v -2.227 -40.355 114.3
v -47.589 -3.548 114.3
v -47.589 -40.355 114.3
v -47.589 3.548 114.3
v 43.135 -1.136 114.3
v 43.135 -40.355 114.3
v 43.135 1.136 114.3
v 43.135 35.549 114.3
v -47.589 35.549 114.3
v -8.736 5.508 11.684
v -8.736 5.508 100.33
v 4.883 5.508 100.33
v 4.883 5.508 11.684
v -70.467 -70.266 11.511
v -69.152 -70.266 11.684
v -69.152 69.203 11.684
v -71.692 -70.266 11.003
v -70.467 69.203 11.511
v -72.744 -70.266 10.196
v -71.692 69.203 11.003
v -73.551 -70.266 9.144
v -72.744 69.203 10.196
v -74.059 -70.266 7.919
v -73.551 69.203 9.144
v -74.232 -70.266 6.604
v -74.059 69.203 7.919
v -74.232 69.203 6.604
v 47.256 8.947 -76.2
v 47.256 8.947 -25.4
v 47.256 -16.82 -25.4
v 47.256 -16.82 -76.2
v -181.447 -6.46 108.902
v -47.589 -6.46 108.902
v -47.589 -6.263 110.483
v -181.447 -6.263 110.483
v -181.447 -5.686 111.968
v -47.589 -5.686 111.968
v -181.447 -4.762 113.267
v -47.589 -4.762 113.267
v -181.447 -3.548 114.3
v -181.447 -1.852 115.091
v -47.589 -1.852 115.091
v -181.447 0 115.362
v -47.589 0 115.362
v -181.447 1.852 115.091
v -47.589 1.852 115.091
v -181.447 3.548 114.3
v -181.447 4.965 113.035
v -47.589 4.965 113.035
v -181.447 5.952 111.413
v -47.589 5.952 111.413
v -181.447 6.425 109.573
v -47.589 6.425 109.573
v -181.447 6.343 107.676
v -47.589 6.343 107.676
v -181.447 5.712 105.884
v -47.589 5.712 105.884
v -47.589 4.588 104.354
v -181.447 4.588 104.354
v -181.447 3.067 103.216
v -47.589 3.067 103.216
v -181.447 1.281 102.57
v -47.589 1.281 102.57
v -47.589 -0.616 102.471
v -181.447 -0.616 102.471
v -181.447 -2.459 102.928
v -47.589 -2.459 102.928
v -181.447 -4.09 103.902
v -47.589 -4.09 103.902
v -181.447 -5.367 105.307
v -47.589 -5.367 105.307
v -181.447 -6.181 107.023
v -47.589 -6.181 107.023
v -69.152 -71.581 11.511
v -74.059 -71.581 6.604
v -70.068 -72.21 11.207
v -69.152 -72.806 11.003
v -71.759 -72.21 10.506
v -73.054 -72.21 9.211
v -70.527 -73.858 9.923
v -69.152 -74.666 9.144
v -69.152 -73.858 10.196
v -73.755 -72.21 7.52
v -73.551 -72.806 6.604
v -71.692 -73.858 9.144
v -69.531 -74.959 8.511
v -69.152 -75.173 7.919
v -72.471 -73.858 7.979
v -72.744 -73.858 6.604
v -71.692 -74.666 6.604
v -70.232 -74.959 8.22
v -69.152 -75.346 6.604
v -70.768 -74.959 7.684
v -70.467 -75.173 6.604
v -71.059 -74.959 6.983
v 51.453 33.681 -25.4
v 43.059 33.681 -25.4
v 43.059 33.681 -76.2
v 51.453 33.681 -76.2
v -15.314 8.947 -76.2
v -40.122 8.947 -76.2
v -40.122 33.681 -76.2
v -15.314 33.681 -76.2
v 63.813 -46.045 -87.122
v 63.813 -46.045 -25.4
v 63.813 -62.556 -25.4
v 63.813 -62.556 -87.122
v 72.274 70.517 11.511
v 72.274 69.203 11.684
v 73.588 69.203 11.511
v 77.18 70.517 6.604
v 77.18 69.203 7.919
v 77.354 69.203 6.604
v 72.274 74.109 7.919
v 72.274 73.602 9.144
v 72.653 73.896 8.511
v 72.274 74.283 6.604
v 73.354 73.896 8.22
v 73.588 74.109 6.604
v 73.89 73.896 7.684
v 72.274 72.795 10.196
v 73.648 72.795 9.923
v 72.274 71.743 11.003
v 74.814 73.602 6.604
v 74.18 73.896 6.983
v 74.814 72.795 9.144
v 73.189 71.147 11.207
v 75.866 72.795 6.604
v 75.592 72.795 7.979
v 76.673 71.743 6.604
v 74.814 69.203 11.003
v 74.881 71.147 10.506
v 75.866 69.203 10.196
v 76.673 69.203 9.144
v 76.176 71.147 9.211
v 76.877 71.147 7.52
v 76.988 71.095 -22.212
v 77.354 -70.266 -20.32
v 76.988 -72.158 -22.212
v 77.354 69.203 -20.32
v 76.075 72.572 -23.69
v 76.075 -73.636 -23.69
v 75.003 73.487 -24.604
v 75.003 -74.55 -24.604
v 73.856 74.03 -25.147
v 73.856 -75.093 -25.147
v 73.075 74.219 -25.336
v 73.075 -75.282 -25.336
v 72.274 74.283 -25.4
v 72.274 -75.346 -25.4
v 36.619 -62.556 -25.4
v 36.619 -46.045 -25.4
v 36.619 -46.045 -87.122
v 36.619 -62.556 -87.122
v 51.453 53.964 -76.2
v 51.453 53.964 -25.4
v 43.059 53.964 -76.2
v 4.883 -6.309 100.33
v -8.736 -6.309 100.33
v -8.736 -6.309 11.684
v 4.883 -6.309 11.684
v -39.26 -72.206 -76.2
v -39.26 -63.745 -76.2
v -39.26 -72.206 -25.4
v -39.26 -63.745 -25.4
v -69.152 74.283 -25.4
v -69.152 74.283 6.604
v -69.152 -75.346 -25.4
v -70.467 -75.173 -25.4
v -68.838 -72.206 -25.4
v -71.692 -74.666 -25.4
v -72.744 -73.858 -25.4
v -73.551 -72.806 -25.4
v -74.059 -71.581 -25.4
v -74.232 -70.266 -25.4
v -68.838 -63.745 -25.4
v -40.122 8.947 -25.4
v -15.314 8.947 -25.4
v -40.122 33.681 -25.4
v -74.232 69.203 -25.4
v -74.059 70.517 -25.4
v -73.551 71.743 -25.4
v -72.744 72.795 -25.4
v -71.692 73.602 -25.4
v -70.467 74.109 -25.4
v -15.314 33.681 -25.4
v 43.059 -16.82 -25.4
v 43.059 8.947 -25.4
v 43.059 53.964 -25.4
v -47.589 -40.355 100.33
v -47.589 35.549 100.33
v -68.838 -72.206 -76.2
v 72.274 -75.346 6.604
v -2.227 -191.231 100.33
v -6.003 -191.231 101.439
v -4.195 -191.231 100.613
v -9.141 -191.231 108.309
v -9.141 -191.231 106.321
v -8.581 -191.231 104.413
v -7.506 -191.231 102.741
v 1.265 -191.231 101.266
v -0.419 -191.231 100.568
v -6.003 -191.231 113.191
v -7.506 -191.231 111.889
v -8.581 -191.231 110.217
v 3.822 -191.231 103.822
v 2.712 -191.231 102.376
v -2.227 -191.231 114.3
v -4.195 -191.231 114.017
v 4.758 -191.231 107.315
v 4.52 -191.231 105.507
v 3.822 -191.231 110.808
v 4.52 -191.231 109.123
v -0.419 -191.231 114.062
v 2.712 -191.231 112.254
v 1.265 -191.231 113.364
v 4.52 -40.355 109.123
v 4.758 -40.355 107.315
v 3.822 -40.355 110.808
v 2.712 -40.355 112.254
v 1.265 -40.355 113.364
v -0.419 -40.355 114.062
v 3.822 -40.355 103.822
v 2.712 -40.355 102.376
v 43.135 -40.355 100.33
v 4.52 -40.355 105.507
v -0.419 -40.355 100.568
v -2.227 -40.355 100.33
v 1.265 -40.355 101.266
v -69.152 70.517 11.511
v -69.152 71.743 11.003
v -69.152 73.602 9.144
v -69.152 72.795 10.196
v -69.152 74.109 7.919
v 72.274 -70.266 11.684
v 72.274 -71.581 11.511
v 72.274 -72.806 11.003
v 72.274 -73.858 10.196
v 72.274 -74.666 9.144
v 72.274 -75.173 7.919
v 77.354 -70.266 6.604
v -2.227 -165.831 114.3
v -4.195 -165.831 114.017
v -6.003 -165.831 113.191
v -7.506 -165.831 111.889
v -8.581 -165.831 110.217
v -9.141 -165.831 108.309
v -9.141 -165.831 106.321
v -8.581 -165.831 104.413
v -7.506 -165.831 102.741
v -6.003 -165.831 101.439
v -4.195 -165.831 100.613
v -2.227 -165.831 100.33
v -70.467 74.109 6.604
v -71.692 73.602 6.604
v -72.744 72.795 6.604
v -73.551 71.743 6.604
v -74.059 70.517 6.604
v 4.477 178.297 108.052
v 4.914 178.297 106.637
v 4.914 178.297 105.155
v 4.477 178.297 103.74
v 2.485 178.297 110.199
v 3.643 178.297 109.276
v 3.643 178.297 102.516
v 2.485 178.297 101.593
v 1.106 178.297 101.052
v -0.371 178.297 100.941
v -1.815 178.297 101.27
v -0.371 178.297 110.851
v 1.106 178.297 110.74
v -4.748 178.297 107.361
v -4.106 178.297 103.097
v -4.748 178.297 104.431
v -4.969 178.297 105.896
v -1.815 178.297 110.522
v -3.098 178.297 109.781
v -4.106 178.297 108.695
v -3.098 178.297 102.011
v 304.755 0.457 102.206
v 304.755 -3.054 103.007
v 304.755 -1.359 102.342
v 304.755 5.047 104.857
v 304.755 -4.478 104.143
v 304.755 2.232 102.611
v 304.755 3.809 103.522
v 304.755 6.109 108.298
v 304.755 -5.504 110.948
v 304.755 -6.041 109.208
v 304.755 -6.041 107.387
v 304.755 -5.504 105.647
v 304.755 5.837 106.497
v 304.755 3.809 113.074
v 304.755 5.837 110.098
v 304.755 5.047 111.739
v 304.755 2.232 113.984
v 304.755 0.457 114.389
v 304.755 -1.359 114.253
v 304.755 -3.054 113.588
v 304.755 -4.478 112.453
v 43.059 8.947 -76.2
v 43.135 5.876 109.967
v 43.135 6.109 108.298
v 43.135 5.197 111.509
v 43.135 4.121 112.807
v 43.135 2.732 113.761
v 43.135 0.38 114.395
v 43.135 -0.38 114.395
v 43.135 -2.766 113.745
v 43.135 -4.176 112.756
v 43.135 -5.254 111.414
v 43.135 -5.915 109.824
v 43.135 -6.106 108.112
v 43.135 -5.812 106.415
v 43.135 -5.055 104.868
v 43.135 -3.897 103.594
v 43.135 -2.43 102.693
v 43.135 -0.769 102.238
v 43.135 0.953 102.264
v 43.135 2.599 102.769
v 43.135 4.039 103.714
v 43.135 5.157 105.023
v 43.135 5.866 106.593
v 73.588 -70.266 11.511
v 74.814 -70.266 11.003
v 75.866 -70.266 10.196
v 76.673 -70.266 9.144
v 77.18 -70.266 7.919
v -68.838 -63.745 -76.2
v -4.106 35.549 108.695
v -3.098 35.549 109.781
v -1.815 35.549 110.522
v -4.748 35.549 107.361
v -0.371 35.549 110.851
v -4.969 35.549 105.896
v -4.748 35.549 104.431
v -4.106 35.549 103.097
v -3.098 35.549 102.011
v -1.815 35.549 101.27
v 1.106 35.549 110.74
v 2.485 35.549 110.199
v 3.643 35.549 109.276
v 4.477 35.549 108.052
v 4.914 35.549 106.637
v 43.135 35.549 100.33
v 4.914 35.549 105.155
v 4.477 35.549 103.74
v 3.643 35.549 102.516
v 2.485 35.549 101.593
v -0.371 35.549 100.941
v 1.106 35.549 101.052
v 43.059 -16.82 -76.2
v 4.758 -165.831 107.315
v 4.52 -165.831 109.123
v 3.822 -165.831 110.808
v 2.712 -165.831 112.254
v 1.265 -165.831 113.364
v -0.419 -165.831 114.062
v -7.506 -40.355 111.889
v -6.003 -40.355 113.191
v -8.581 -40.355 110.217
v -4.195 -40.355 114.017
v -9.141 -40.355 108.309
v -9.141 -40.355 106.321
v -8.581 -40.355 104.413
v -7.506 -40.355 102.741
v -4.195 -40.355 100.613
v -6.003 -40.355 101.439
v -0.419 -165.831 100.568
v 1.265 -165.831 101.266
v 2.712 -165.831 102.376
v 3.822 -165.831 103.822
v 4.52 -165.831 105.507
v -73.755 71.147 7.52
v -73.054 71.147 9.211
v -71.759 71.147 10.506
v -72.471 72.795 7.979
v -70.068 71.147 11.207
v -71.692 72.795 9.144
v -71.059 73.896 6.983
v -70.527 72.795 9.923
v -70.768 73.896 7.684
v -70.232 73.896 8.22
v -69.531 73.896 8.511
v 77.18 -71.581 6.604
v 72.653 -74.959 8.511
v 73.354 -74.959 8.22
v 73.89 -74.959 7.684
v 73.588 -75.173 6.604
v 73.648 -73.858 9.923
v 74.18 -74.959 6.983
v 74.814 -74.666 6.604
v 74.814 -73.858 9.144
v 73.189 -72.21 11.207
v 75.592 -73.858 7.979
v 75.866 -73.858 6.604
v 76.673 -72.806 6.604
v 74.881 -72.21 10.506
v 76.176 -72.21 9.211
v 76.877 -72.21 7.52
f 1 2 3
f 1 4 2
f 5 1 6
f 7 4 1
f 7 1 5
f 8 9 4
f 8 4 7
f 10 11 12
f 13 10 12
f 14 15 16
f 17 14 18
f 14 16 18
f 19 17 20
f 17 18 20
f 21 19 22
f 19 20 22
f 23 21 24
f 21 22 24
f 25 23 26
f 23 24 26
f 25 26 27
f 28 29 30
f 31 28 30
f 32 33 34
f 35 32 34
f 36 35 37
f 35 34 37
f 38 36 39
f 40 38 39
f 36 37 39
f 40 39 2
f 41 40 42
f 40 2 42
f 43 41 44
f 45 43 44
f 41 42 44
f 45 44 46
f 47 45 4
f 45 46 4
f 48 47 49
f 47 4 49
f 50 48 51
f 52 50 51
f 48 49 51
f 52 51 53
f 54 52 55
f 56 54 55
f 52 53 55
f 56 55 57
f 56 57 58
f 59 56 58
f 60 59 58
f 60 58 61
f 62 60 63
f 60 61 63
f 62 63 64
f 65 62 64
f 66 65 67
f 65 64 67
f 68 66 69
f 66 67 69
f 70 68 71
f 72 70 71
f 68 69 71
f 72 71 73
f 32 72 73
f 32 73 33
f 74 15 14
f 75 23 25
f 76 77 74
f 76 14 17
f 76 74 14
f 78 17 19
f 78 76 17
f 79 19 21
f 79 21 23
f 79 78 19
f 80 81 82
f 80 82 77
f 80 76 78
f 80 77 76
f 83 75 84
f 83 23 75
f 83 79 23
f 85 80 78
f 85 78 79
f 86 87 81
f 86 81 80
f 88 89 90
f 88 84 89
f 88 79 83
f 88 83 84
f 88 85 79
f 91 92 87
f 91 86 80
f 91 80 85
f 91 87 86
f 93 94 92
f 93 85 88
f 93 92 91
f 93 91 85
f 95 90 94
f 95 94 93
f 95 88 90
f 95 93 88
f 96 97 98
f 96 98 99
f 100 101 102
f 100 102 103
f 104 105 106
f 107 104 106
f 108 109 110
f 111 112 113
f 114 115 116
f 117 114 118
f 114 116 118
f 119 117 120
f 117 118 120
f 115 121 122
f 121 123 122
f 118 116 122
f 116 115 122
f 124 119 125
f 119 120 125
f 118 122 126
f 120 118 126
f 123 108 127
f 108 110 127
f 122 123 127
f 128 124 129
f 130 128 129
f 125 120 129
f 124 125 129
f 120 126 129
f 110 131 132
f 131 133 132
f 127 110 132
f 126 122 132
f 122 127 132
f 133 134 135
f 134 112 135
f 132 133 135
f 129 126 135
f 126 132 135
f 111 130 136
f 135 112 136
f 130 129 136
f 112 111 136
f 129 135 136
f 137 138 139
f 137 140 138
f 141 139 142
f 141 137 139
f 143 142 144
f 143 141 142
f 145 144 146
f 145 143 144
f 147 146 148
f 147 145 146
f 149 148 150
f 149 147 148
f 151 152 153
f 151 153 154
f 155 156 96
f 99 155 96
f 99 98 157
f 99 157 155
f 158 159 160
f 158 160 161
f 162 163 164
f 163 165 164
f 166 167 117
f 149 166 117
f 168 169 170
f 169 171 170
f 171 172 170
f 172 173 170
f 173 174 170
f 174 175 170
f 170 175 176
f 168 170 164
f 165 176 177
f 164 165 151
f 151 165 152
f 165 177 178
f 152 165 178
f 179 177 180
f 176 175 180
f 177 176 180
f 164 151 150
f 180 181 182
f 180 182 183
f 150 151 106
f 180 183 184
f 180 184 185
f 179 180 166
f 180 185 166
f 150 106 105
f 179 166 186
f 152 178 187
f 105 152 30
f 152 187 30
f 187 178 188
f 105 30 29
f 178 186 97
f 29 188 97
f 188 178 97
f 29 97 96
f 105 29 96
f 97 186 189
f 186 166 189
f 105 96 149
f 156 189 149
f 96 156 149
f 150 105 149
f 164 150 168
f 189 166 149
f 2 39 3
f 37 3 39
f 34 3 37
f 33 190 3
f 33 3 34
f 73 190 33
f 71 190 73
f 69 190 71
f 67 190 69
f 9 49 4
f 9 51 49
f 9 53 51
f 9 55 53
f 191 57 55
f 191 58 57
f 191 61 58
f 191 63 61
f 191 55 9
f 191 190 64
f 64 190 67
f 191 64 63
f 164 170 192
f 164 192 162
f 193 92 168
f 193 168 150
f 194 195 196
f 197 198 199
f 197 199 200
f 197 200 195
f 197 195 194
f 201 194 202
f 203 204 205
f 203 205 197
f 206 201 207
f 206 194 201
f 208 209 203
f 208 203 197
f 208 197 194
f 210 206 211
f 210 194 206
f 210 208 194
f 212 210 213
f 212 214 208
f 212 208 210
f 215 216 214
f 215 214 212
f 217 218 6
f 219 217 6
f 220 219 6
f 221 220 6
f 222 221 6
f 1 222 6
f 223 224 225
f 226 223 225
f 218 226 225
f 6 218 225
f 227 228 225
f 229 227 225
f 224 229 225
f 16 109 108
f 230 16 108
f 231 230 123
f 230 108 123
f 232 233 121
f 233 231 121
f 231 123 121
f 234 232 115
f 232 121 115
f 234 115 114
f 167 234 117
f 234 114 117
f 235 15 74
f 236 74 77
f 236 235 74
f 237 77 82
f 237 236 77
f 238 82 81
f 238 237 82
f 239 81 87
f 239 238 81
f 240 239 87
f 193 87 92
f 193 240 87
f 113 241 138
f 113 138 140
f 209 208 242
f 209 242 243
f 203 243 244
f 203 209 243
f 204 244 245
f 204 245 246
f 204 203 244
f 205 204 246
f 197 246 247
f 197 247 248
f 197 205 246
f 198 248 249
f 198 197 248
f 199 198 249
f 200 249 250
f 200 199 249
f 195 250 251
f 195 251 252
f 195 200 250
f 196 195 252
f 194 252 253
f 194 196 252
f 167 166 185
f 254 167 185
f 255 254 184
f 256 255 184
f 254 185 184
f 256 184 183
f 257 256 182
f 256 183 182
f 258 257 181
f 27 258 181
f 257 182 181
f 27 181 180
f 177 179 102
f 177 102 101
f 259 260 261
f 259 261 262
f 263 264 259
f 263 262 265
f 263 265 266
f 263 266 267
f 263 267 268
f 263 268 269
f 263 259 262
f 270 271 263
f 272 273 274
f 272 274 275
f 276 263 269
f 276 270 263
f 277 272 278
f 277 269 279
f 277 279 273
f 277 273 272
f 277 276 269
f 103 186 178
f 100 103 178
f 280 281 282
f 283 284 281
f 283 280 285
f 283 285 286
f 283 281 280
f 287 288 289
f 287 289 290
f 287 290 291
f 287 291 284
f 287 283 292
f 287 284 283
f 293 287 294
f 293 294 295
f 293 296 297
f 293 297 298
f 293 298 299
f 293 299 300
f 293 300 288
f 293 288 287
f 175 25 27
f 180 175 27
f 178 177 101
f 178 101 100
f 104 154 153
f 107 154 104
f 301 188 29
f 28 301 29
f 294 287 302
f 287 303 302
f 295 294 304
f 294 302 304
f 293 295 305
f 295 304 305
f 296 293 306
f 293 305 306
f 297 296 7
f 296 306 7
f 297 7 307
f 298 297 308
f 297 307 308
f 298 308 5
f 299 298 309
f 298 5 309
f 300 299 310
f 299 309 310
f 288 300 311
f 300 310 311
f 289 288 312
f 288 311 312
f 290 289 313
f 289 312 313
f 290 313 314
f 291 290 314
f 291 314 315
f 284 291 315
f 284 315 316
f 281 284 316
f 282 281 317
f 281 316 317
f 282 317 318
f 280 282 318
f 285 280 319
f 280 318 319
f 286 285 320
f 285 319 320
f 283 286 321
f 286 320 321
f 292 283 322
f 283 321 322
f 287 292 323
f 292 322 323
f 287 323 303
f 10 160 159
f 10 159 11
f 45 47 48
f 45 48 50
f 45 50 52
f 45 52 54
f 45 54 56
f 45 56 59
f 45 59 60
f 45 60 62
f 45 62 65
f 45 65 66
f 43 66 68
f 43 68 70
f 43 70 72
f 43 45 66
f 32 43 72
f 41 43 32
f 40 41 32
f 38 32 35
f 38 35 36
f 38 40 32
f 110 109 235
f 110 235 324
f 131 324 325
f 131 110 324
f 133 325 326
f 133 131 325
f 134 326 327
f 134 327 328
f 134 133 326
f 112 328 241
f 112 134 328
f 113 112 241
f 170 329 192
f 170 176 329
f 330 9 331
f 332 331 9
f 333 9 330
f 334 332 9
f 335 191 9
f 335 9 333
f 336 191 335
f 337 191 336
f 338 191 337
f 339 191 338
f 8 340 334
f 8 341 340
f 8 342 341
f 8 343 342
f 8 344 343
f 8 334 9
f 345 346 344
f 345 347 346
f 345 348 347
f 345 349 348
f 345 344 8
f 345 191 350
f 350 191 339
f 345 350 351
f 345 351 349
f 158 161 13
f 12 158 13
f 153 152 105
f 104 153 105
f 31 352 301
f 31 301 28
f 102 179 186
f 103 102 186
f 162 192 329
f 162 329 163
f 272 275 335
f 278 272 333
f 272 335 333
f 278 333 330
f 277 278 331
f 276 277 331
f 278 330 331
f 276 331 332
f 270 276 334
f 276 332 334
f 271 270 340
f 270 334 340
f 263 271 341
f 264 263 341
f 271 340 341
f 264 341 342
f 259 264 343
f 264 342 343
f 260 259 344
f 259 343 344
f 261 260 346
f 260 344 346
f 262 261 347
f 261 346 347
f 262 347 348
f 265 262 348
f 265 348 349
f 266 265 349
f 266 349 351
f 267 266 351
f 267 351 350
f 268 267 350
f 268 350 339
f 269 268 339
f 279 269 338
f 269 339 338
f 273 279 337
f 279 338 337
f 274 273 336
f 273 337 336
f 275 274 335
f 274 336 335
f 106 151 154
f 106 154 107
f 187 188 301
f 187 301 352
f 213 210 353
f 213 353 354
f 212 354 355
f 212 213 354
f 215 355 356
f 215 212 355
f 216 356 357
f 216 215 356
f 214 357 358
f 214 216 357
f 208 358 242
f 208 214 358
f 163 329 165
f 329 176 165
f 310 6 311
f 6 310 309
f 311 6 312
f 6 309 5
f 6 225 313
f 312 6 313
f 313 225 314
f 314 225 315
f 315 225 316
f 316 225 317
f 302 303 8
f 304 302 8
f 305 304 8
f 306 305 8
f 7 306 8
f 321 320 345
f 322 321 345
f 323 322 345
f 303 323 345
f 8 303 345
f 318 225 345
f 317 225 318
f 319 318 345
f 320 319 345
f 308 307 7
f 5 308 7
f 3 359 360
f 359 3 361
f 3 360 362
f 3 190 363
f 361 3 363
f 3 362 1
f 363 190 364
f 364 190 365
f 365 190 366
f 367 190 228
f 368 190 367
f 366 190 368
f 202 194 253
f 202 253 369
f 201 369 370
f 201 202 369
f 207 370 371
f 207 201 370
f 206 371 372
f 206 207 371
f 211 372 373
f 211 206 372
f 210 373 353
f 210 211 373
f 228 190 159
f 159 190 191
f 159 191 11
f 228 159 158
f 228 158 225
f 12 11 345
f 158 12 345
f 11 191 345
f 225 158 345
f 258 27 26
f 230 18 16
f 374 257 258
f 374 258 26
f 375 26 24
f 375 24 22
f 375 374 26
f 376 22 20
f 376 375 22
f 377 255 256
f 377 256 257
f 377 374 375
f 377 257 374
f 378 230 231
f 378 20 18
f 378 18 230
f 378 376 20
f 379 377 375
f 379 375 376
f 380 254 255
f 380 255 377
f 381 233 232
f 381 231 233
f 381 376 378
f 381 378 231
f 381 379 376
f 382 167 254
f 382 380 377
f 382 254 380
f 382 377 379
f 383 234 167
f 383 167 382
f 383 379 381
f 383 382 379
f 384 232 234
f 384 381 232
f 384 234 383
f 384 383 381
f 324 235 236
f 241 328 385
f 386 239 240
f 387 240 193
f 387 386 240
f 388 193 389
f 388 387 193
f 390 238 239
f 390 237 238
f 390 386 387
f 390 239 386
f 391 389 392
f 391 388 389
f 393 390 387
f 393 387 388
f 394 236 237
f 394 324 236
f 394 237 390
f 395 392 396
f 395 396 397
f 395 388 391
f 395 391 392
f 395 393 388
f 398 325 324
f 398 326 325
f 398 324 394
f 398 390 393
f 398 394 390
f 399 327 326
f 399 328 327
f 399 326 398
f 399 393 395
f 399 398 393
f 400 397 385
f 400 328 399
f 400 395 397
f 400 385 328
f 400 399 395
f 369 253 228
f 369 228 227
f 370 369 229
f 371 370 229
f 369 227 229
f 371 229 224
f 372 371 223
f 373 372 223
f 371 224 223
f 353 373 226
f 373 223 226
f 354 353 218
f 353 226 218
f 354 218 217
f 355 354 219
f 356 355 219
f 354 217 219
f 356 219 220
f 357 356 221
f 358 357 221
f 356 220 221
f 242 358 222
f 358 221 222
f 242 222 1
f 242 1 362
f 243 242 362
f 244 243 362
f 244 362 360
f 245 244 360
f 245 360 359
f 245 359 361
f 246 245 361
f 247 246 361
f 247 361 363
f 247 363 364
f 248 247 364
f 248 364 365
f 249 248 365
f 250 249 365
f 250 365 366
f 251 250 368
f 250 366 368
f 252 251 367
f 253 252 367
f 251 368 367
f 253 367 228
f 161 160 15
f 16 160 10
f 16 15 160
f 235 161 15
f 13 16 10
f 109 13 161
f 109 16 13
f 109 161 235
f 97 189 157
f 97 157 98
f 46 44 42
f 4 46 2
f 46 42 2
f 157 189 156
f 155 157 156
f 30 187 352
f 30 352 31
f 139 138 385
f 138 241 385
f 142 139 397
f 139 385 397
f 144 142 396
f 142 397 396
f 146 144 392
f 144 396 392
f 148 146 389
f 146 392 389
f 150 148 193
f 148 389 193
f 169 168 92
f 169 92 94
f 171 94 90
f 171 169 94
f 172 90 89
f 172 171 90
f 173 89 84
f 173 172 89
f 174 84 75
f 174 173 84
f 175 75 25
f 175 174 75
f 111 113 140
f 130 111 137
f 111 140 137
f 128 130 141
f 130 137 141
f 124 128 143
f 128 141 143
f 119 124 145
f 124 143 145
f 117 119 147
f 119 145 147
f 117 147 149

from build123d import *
from build123d import SkipClean  # not in build123d's __all__

# Parameters (mm, degrees)
F0_W          = 151.5855640173
F0_H          = 149.6286615729
F1_DEPTH      = 11.684
F2_DEPTH      = 25.4
F3_W          = 4.1966233402
F3_H          = 25.7666455582
F3_W_2        = 24.8086545616
F3_H_2        = 24.7343285009
F3_W_3        = 8.3932466805
F3_H_3        = 20.2822238207
F3_W_4        = 29.5776501298
F3_H_4        = 8.4610134363
F5_DEPTH      = 25.4
F6_DEPTH      = 25.4
F8_W          = 13.618723955
F8_H          = 11.8162455037
F9_DEPTH      = 88.646
F10_W         = 90.7247327268
F10_H         = 75.9043544531
F11_DEPTH     = 13.97
F13_DEPTH     = 25.4
F14_DEPTH     = 125.476
F16_DEPTH     = 25.4
F17_R         = 4.969033059
F18_DEPTH     = 117.348
F20_DEPTH     = 87.376
F21_R         = 6.1087740457
F22_DEPTH     = 25.4
F23_DEPTH     = 25.4
F24_DEPTH     = 25.4
F25_R         = 5.08
F26_T1_DEPTH  = 44.704
F26_S5_W      = 5.08
F26_S5_H      = 5.08
F26_T6_DEPTH  = 5.08
F26_S11_W     = 5.08
F26_S11_H     = 5.08
F26_T12_DEPTH = 5.08
F27_W         = 27.1943286061
F27_H         = 16.5108405054
F28_DEPTH     = 61.722
F29_DEPTH     = 25.4
F30_DEPTH     = 160.02
F31_DEPTH     = 46.482


# Not quite as in the source:
# - a fillet or chamfer that OpenCascade refuses, or shapes differently, is made with other operations: its cross-section is extruded or revolved along the edge and cut away or added
# - after a boolean that leaves OpenCascade's solid faulty, fix() repairs it
# - a feature names something its author has since deleted; it is built from what else it names


with BuildPart() as f1:
    # F0 (on Top) → F1 (new body)
    with BuildSketch(Plane.XY):
        with Locations((1.5608146787, -0.5317740142)):
            Rectangle(F0_W, F0_H)
    extrude(amount=F1_DEPTH)

    # F2 (add): a face of the model
    f2_faces = [f1.faces().sort_by_distance(p)[0] for p in [
        (1.5608146787, -0.5317740142, 0),
    ]]
    extrude(f2_faces, amount=F2_DEPTH)

    # F3 (on face) → F5 (join)
    with BuildSketch(Plane(origin=(0, 0, -25.4), x_dir=(1, 0, 0), z_dir=(0, 0, -1))):
        with Locations((45.1576719061, 3.9362064563)):
            Rectangle(F3_W, F3_H)
        with Locations((-27.7178613469, -21.3142805733)):
            Rectangle(F3_W_2, F3_H_2)
        with Locations((47.2559835762, -43.8225567341)):
            Rectangle(F3_W_3, F3_H_3)
        with Locations((-54.0488772094, 67.9751783609)):
            Rectangle(F3_W_4, F3_H_4)
    extrude(amount=F5_DEPTH)

    # F6 (add): faces of the model
    f6_faces = [f1.faces().sort_by_distance(p)[0] for p in [
        (-54.0488772094, -67.9751783609, -50.8),
        (-27.7178613469, 21.3142805733, -50.8),
        (45.1576719061, -3.9362064563, -50.8),
        (47.2559835762, 43.8225567341, -50.8),
    ]]
    extrude(f6_faces, amount=F6_DEPTH)

    # F8 (on face) → F9 (join)
    with BuildSketch(Plane.XY.offset(11.684)):
        with Locations((-1.9266440067, -0.4005506635)):
            Rectangle(F8_W, F8_H)
    extrude(amount=F9_DEPTH)

    # F10 (on face) → F11 (join)
    with BuildSketch(Plane.XY.offset(100.33)):
        with Locations((-2.2270549089, -2.4033039808)):
            Rectangle(F10_W, F10_H)
    extrude(amount=F11_DEPTH)

    # F12 (on face) → F13 (join)
    with BuildSketch(Plane.XZ.offset(40.3554812074)):
        with BuildLine():
            ThreePointArc((-2.2270549227, 100.33), (2.7120859528, 102.3758591285), (4.7579450911, 107.315))
            ThreePointArc((4.7579450911, 107.315), (2.712085945, 112.2541408793), (-2.227054945, 114.3))
            ThreePointArc((-2.227054945, 114.3), (-9.2120549089, 107.3149999888), (-2.2270549227, 100.33))
        make_face()
    extrude(amount=F13_DEPTH)

    # F14 (add): a face of the model
    f14_faces = [f1.faces().sort_by_distance(p)[0] for p in [
        (-2.2270549089, -65.7554812074, 107.315),
    ]]
    with SkipClean():  # cleaning this boolean's faces spoils the solid; the shape is the same uncleaned
        extrude(f14_faces, amount=F14_DEPTH)

    # F15 (on face) → F16 (join)
    with BuildSketch(Plane.YZ.offset(43.1353114545)):
        with BuildLine():
            Line((-1.1355586467, 114.3), (1.1355586467, 114.3))
            ThreePointArc((1.1355586467, 114.3), (0, 114.4064722454), (-1.1355586467, 114.3))
        make_face()
        with BuildLine():
            ThreePointArc((-1.1355586467, 114.3), (-3.8974510358, 103.5937641266), (6.1087740457, 108.2976981997))
            ThreePointArc((6.1087740457, 108.2976981997), (4.7039340732, 112.1951492356), (1.1355586467, 114.3))
            Line((1.1355586467, 114.3), (-1.1355586467, 114.3))
        make_face()
    extrude(amount=F16_DEPTH)

    add(f1.part.fix(), mode=Mode.REPLACE)

    # F17 (on face) → F18 (join)
    with BuildSketch(Plane(origin=(0, 35.5488732457, 0), x_dir=(-1, 0, 0), z_dir=(0, 1, 0))):
        with Locations((0, 105.8959811926)):
            Circle(F17_R)
    extrude(amount=F18_DEPTH)

    # F19 (on face) → F20 (join)
    with BuildSketch(Plane(origin=(-47.5894212723, 0, 0), x_dir=(0, -1, 0), z_dir=(-1, 0, 0))):
        with BuildLine():
            Line((-3.5482673546, 114.3), (3.5482673546, 114.3))
            ThreePointArc((3.5482673546, 114.3), (0, 115.3617326707), (-3.5482673546, 114.3))
        make_face()
        with BuildLine():
            ThreePointArc((-3.5482673546, 114.3), (-3.0667012813, 103.2161631583), (6.4599488467, 108.901783824))
            ThreePointArc((6.4599488467, 108.901783824), (5.6856206657, 111.9684851053), (3.5482673546, 114.3))
            Line((3.5482673546, 114.3), (-3.5482673546, 114.3))
        make_face()
    extrude(amount=F20_DEPTH)

    # F21 (on face) → F22 (join)
    with BuildSketch(Plane.YZ.offset(68.5353114545)):
        with Locations((0, 108.2976981997)):
            Circle(F21_R)
    extrude(amount=F22_DEPTH)

    # F23 (add): faces of the model
    f23_faces = [f1.faces().sort_by_distance(p)[0] for p in [
        (0, 152.8968732457, 105.8959811926),
        (-2.2270549089, -191.2314812074, 107.315),
    ]]
    extrude(f23_faces, amount=F23_DEPTH, dir=(0, 1, 0))

    # F24 (add): a face of the model
    f24_faces = [f1.faces().sort_by_distance(p)[0] for p in [
        (93.9353114545, 0, 108.2976981997),
    ]]
    extrude(f24_faces, amount=F24_DEPTH)

    # F25
    f25_edges = [f1.edges().sort_by_distance(p)[0] for p in [
        (77.353597, -0.531774, 11.684),
        (1.560815, -75.346105, 11.684),
        (-74.231967, -0.531774, 11.684),
        (1.560815, 74.282557, 11.684),
        (77.353597, -75.346105, -6.858),
        (77.353597, 74.282557, -6.858),
        (77.353597, -0.531774, -25.4),
    ]]
    fillet(f25_edges, radius=F25_R)

    # F26: fillet of radius 5.08 on 2 edges, made by hand

    # F26_s2 → F26_t1 (cut)
    with BuildSketch(Plane.XY.offset(-38.1)):
        with BuildLine():
            ThreePointArc((-69.15196733, -75.3461048007), (-72.7440697784, -73.8582072491), (-74.23196733, -70.2661048007))
            Line((-74.23196733, -70.2661048007), (-74.23196733, -75.3461048007))
            Line((-74.23196733, -75.3461048007), (-69.15196733, -75.3461048007))
        make_face()
        with BuildLine():
            ThreePointArc((-69.15196733, 74.2825567722), (-72.7440697784, 72.7946592207), (-74.23196733, 69.2025567722))
            Line((-74.23196733, 69.2025567722), (-74.23196733, 74.2825567722))
            Line((-74.23196733, 74.2825567722), (-69.15196733, 74.2825567722))
        make_face()
    extrude(amount=F26_T1_DEPTH, mode=Mode.SUBTRACT)


with BuildPart() as f26_tool4:
    # F26_s5 → F26_t6 (new body)
    with BuildSketch(Plane.XZ.offset(-69.2025567722)):
        with Locations((-71.69196733, 9.144)):
            Rectangle(F26_S5_W, F26_S5_H)
    extrude(amount=-F26_T6_DEPTH)

    # F26_s7 → F26_t8 (revolve, cut)
    with BuildSketch(Plane(origin=(-69.15196733, 69.2025567722, 6.604), x_dir=(0.7071067812, 0, -0.7071067812), z_dir=(0.7071067812, 0, 0.7071067812))):
        with BuildLine():
            ThreePointArc((0, -5.08), (5.08, 0), (0, 5.08))
            Line((0, 5.08), (0, -5.08))
        make_face()
    revolve(axis=Axis((-69.15196733, 69.2025567722, 6.604), (0, 1, 0)), mode=Mode.SUBTRACT)


with BuildPart() as f1_1:
    add(f1.part, clean=False)

    # F26_t3: cut F26_tool4
    add(f26_tool4.part, mode=Mode.SUBTRACT)


with BuildPart() as f26_tool10:
    # F26_s11 → F26_t12 (new body)
    with BuildSketch(Plane.XZ.offset(70.2661048007)):
        with Locations((-71.69196733, 9.144)):
            Rectangle(F26_S11_W, F26_S11_H)
    extrude(amount=F26_T12_DEPTH)

    # F26_s13 → F26_t14 (revolve, cut)
    with BuildSketch(Plane(origin=(-69.15196733, -70.2661048007, 6.604), x_dir=(0.7071067812, 0, -0.7071067812), z_dir=(-0.7071067812, 0, -0.7071067812))):
        with BuildLine():
            ThreePointArc((0, -5.08), (5.08, 0), (0, 5.08))
            Line((0, 5.08), (0, -5.08))
        make_face()
    revolve(axis=Axis((-69.15196733, -70.2661048007, 6.604), (0, -1, 0)), mode=Mode.SUBTRACT)


with BuildPart() as f1_2:
    add(f1_1.part, clean=False)

    # F26_t9: cut F26_tool10
    add(f26_tool10.part, mode=Mode.SUBTRACT)

    # F27 (on face) → F28 (join)
    with BuildSketch(Plane(origin=(0, 0, -25.4), x_dir=(1, 0, 0), z_dir=(0, 0, -1))):
        with Locations((50.2156950533, 54.3001759797)):
            Rectangle(F27_W, F27_H)
    extrude(amount=F28_DEPTH)

    # F29 (add): a face of the model
    f29_faces = [f1_2.faces().sort_by_distance(p)[0] for p in [
        (119.3353114545, 0, 108.2976981997),
    ]]
    extrude(f29_faces, amount=F29_DEPTH)

    # F30 (add): a face of the model
    f30_faces = [f1_2.faces().sort_by_distance(p)[0] for p in [
        (144.7353114545, 0, 108.2976981997),
    ]]
    extrude(f30_faces, amount=F30_DEPTH)

    # F31 (add): a face of the model
    f31_faces = [f1_2.faces().sort_by_distance(p)[0] for p in [
        (-134.9654212723, 0, 108.901783824),
    ]]
    extrude(f31_faces, amount=F31_DEPTH)


solid = f1_2.part
